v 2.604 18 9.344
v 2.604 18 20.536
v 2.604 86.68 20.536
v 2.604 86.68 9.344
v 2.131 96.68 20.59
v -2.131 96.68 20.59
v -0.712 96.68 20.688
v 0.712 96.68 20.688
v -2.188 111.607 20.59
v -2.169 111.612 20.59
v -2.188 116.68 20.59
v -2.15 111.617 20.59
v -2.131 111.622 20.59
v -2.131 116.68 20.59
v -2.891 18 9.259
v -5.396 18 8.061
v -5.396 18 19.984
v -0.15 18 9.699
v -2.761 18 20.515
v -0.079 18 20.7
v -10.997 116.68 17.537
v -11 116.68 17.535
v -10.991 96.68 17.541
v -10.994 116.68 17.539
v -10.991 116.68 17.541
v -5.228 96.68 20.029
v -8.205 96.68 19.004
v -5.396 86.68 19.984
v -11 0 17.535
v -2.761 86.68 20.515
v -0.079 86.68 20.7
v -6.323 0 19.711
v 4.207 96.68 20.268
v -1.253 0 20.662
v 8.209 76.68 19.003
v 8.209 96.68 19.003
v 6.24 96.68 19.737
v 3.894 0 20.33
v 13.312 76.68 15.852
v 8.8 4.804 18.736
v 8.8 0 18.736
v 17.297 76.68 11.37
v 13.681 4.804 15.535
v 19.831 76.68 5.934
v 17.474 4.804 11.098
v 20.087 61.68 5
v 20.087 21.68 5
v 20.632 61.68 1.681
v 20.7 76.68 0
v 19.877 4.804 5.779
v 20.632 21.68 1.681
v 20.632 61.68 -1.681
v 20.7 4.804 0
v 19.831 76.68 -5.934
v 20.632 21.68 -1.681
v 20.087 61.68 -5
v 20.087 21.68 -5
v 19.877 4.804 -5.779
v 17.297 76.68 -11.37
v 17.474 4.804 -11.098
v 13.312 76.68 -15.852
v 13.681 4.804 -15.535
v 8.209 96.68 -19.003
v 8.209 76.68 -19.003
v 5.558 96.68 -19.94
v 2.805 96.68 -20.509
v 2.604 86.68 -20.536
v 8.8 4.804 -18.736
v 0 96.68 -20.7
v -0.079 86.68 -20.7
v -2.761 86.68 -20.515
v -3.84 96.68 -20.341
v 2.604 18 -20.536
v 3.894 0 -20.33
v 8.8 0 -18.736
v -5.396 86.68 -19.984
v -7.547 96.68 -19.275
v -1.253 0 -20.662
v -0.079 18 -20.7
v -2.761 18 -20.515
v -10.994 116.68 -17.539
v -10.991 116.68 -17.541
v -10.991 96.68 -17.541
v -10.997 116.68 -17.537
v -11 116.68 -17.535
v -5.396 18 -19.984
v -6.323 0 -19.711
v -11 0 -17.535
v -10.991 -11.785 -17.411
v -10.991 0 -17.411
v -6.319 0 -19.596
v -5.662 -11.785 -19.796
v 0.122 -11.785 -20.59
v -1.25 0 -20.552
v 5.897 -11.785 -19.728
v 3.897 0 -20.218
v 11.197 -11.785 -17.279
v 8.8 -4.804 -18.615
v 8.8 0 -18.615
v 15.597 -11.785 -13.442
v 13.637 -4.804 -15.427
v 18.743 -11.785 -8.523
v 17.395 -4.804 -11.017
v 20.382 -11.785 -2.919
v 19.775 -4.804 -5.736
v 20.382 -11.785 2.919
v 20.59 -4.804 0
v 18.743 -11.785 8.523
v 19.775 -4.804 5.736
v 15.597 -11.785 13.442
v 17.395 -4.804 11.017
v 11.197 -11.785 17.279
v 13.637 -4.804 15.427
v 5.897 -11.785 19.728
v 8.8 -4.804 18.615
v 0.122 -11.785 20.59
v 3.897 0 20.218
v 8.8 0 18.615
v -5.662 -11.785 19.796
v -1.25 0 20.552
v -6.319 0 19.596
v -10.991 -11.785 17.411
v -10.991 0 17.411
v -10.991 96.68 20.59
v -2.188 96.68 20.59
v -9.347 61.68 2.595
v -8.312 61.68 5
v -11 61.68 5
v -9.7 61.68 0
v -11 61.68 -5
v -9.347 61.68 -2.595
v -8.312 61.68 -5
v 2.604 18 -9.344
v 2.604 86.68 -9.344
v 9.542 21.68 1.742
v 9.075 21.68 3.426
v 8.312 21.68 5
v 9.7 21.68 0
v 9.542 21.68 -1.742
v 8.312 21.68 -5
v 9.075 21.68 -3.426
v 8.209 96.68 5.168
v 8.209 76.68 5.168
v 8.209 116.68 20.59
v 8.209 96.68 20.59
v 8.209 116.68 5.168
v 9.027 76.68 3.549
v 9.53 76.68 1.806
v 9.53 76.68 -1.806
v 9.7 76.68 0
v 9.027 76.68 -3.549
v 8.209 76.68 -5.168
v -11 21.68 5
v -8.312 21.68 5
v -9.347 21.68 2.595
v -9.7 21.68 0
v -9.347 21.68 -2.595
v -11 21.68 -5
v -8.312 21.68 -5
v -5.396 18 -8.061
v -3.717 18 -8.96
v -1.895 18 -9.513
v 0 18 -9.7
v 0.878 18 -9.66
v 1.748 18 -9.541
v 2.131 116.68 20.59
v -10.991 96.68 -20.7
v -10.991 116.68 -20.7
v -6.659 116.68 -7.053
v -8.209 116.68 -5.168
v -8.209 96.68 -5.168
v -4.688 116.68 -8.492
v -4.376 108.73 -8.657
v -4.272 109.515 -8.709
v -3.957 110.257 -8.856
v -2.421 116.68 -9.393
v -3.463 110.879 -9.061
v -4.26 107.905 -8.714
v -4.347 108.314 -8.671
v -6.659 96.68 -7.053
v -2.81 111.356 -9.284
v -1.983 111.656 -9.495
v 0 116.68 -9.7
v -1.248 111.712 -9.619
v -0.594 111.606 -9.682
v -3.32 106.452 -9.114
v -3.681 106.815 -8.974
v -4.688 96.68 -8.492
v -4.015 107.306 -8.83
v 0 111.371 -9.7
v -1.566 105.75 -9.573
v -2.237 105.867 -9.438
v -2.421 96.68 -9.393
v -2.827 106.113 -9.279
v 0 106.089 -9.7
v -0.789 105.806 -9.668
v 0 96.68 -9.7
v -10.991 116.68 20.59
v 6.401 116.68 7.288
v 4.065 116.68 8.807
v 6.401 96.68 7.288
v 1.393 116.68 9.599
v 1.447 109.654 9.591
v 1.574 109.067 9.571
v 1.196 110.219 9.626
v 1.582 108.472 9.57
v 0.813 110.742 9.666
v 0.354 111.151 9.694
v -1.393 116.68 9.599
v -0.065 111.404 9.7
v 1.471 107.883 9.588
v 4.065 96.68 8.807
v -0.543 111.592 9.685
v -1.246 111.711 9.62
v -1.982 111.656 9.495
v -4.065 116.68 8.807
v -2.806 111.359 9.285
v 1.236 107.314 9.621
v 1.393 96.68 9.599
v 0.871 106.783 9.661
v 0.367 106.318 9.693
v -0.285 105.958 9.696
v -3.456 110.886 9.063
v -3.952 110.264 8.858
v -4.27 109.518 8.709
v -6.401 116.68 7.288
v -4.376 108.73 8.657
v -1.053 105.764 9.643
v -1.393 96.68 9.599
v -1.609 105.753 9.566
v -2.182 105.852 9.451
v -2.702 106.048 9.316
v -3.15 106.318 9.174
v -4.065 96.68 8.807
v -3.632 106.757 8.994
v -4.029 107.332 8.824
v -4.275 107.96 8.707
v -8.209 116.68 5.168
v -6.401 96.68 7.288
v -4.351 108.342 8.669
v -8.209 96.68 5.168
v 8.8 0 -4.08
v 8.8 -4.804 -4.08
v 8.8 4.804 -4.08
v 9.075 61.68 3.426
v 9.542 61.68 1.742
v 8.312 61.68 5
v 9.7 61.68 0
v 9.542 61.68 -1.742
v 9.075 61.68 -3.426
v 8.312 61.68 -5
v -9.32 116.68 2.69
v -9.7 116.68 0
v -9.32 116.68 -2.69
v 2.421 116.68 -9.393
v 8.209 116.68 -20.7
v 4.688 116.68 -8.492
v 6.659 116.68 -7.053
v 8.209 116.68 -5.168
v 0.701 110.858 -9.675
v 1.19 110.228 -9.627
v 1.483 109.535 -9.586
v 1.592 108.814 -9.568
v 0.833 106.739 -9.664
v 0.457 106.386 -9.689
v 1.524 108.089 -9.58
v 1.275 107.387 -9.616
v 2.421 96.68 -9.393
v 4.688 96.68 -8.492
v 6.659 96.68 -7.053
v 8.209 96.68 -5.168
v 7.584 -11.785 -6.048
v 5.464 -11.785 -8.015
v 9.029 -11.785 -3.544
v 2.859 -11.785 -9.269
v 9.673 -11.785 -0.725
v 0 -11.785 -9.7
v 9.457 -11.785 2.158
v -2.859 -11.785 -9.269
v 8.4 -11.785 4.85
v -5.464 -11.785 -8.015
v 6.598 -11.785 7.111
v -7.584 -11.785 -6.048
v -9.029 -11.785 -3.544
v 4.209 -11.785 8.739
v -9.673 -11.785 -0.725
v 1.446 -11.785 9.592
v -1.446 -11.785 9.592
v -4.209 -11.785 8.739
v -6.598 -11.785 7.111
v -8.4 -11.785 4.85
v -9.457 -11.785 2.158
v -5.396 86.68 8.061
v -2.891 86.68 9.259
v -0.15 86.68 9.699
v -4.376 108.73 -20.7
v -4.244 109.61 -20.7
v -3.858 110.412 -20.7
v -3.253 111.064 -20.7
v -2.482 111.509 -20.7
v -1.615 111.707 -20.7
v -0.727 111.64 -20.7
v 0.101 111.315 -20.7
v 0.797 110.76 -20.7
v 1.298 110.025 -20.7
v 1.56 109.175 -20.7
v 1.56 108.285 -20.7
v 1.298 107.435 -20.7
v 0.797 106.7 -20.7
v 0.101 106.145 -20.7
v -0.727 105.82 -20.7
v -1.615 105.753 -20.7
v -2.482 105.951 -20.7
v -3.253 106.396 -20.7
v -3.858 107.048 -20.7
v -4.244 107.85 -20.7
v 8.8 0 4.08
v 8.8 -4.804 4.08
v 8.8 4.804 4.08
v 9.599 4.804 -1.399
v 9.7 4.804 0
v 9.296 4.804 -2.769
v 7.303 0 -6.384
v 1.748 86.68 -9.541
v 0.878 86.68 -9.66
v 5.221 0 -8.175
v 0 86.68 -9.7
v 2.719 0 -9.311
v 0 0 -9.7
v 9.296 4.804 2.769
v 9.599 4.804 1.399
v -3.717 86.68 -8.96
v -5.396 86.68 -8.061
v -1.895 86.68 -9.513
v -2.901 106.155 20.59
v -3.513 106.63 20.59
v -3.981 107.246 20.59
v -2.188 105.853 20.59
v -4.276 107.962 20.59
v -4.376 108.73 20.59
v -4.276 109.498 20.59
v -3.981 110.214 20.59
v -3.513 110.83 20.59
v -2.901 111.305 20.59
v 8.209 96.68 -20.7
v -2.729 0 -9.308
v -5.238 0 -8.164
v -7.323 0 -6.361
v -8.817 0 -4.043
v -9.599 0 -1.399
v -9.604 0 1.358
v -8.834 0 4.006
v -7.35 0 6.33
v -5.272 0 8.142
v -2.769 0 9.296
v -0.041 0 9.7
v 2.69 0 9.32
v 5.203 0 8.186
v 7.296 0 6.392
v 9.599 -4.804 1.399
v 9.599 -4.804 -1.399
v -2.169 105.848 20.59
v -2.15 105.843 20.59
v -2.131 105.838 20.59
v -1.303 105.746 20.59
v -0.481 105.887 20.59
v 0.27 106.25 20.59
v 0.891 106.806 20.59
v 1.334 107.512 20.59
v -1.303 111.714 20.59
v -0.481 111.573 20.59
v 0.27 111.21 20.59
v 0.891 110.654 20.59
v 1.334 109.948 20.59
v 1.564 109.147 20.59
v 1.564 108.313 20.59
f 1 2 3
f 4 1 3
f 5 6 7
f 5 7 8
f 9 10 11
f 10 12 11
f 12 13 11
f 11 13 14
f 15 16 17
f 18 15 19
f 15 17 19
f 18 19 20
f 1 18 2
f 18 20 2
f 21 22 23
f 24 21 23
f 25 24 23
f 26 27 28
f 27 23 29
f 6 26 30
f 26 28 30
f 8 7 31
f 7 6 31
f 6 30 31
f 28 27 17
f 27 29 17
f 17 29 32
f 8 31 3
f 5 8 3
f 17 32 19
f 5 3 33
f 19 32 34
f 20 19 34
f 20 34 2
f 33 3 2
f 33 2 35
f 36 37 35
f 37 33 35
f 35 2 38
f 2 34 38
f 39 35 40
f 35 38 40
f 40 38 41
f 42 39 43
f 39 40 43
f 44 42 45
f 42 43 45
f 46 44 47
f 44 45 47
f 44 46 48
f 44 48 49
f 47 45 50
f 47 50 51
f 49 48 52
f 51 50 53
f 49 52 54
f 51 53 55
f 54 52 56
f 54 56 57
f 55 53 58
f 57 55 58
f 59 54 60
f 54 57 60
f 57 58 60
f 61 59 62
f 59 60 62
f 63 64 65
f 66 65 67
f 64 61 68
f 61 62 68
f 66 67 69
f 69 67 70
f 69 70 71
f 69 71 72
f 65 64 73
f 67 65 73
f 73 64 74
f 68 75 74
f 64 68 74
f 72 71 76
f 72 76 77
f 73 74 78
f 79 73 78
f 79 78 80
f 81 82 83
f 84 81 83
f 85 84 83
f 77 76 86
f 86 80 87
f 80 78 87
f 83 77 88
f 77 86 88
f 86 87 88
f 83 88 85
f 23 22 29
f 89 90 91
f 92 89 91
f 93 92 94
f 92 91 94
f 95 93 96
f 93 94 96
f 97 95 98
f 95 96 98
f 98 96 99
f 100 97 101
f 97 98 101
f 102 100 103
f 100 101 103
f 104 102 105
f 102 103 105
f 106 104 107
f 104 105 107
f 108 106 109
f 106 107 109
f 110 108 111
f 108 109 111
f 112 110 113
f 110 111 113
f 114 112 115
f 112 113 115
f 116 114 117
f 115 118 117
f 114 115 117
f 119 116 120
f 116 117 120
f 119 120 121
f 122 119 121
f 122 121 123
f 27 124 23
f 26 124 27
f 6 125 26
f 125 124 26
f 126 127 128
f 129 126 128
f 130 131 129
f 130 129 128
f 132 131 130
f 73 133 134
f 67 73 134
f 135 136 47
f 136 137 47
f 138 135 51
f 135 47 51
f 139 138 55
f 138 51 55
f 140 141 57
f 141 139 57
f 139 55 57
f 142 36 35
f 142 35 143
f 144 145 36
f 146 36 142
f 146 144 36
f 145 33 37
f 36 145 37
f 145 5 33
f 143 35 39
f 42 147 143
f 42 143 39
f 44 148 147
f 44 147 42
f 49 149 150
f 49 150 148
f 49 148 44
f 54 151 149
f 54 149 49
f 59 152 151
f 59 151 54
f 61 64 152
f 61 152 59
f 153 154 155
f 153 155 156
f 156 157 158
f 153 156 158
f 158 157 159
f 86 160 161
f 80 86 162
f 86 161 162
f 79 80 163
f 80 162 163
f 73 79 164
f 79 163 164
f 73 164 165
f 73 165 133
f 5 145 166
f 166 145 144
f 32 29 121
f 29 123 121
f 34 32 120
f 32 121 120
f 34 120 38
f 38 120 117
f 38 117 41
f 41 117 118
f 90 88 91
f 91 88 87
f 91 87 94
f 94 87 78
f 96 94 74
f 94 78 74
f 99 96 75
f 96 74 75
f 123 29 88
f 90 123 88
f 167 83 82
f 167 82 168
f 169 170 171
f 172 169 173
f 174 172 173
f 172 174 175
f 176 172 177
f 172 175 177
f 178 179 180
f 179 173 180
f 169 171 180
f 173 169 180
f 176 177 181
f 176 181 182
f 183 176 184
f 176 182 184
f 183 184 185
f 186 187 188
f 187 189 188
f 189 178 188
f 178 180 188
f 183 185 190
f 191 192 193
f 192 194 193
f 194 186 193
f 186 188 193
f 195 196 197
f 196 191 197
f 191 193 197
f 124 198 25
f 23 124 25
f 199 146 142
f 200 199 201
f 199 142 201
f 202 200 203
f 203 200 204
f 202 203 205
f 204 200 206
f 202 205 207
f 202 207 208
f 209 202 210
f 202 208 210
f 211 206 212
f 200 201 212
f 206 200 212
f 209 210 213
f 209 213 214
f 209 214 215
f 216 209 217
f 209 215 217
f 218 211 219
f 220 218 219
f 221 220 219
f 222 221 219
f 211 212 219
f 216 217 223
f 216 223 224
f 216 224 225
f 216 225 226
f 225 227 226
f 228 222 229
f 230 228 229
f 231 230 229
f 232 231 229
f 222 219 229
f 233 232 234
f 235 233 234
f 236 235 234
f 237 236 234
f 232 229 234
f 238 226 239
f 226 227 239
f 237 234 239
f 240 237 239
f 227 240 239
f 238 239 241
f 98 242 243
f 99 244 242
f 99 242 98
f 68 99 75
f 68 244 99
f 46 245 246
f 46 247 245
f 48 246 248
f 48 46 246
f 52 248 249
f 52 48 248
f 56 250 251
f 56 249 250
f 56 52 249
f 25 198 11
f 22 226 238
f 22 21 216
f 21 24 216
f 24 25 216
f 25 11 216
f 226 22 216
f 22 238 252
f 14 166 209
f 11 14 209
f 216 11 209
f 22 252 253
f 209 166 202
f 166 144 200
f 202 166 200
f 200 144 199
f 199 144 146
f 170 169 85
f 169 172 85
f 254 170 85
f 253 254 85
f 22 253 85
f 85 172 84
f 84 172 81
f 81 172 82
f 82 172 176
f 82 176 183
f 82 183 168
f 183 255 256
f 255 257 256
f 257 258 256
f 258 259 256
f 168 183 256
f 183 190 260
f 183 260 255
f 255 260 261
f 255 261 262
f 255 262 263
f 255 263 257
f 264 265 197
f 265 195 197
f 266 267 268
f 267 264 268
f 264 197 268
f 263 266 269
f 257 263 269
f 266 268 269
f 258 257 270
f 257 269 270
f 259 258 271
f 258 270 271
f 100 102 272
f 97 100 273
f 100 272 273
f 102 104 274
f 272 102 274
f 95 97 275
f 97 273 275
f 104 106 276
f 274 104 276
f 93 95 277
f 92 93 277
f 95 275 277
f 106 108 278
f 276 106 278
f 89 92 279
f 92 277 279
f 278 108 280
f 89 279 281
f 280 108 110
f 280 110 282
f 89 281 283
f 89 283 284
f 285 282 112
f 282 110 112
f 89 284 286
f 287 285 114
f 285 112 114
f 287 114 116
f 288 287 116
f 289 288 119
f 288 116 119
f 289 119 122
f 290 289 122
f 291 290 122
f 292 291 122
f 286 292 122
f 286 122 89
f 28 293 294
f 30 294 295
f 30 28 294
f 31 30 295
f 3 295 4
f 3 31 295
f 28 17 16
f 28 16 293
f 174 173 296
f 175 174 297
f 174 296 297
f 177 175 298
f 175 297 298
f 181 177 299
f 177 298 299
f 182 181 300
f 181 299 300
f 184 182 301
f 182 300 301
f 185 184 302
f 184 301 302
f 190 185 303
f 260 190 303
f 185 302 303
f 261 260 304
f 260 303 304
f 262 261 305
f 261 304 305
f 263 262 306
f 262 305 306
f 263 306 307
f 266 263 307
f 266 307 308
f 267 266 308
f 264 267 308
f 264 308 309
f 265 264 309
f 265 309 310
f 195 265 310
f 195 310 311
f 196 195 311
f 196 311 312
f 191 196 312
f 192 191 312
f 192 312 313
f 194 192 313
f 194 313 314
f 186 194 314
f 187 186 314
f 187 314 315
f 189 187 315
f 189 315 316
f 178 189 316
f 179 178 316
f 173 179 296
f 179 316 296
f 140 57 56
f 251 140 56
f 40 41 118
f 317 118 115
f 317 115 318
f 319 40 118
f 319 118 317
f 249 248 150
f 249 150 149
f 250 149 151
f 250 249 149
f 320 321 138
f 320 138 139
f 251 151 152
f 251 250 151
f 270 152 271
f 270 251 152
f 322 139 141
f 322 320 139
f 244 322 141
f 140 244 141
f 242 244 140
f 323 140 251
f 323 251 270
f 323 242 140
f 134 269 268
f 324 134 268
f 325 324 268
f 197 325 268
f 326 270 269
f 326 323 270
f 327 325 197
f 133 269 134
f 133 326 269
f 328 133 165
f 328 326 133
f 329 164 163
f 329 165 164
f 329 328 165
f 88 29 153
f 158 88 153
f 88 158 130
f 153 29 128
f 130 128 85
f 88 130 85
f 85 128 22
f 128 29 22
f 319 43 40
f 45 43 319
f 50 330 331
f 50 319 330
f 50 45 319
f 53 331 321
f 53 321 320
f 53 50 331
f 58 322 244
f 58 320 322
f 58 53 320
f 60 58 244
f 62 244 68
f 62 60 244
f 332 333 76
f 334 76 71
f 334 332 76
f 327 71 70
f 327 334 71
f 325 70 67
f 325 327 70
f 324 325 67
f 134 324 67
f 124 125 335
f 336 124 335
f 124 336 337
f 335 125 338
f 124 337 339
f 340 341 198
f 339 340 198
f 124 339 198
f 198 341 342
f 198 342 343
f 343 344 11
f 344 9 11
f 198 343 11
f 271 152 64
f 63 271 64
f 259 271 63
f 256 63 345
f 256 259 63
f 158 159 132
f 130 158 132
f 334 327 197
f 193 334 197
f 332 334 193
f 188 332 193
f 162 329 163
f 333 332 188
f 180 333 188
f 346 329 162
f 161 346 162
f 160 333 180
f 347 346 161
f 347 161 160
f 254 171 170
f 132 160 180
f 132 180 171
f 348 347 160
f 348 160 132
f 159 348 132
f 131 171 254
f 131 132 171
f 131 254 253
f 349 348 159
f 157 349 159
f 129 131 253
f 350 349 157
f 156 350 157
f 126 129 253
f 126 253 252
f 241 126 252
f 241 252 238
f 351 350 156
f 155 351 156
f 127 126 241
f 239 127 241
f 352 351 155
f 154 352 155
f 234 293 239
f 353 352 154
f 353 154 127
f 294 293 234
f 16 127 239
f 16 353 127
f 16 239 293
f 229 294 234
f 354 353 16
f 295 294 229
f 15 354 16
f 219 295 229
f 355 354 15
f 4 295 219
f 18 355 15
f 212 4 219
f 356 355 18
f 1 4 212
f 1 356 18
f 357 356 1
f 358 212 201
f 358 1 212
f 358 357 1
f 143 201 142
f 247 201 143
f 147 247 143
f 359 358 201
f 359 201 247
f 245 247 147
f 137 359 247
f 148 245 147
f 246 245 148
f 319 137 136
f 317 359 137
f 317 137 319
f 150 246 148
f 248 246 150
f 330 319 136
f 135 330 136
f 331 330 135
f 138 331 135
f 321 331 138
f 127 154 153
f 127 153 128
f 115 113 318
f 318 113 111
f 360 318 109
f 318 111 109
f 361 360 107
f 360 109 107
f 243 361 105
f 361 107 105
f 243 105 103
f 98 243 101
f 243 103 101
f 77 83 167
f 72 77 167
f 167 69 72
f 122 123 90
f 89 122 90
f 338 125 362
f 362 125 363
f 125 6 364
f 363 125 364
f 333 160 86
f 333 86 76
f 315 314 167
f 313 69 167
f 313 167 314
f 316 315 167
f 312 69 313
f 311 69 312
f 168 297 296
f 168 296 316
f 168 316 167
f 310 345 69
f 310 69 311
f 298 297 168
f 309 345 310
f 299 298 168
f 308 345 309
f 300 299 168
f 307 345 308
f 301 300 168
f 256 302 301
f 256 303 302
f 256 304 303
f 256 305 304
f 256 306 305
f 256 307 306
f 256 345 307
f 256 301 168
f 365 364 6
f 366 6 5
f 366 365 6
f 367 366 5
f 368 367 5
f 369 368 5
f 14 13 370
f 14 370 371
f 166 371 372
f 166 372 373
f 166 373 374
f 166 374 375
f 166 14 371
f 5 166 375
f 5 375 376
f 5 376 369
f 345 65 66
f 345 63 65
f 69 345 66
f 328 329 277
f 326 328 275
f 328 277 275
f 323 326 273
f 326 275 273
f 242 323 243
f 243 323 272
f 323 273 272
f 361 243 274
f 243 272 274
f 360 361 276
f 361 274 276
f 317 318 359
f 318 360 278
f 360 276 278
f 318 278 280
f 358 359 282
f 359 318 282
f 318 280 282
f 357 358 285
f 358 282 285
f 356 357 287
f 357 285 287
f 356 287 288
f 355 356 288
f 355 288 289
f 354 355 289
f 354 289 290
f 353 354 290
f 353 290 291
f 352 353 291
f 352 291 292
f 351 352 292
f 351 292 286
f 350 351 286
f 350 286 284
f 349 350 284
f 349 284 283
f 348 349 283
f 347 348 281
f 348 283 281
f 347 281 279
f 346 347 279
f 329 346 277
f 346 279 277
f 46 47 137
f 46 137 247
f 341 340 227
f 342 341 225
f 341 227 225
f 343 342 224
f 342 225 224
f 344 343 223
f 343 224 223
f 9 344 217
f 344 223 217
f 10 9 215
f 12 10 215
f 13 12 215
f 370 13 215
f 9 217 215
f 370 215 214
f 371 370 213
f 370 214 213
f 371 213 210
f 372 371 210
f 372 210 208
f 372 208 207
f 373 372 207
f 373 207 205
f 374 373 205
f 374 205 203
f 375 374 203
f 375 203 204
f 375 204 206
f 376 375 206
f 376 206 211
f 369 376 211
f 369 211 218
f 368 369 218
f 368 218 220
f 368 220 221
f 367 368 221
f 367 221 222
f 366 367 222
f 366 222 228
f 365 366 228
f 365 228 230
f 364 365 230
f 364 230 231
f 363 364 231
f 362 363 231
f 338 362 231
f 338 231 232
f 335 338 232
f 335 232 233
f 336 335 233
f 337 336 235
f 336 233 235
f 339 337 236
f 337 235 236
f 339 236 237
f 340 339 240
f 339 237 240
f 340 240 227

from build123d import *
from build123d.topology import SkipClean

# Parameters (mm, degrees)
SKETCH_1_R           = 20.7
SKETCH_1_R_2         = 9.7
EXTRUDE_1_DEPTH      = 116.68
SKETCH_11_W          = 27
SKETCH_11_H          = 150
CUT_EXTRUDE_3_DEPTH  = 40
SKETCH_13_W          = 10
SKETCH_13_H          = 128.345013401
CUT_EXTRUDE_7_DEPTH  = 126.624847861
SKETCH_15_W          = 8
SKETCH_15_H          = 68.68
CUT_EXTRUDE_9_DEPTH  = 48
SKETCH_16_W          = 15.531795971
SKETCH_16_H          = 20
SKETCH_16_W_2        = 15.421795971
EXTRUDE_4_DEPTH      = 19.2
SKETCH_21_R          = 2.985
CUT_EXTRUDE_12_DEPTH = 55.2
SKETCH_24_R          = 20.59
SKETCH_24_R_2        = 9.59
EXTRUDE_2_DEPTH      = 55.2
CUT_EXTRUDE_13_DEPTH = 55.2
SKETCH_26_W          = 10.00851187
SKETCH_26_H          = 41.7
CUT_EXTRUDE_15_DEPTH = 55.2
SKETCH_27_W          = 10
SKETCH_27_H          = 40
CUT_EXTRUDE_16_DEPTH = 55.2
SKETCH_28_W          = 44.880694938
SKETCH_28_H          = 9.608044066
CUT_EXTRUDE_17_DEPTH = 12.2
CUT_EXTRUDE_START    = -130
SKETCH_63_R          = 9.59
CUT_EXTRUDE_36_DEPTH = 130
SKETCH_64_R          = 9.7
CUT_EXTRUDE_37_DEPTH = 132.758249301
SKETCH_66_W          = 4.319030686
SKETCH_66_H          = 0.800519568
CUT_EXTRUDE_39_DEPTH = 20


with BuildPart() as part:
    # 草圖1 → 伸長-薄件1 (new body)
    with BuildSketch(Plane(origin=(0, 0, 0), x_dir=(1, 0, 0), z_dir=(0, 1, 0))):
        Circle(SKETCH_1_R)
        Circle(SKETCH_1_R_2, mode=Mode.SUBTRACT)
    extrude(amount=EXTRUDE_1_DEPTH)

    # 草圖11 → 除料-伸長3 (cut)
    with BuildSketch(Plane(origin=(0, 116.68, 0), x_dir=(1, 0, 0), z_dir=(0, 1, 0))):
        with Locations((21.70851187, -44.235815192)):
            Rectangle(SKETCH_11_W, SKETCH_11_H)
    extrude(amount=-CUT_EXTRUDE_3_DEPTH, mode=Mode.SUBTRACT)

    # 草圖13 → 除料-伸長7 (cut, through all)
    with BuildSketch(Plane.XY.offset(21)):
        with Locations((-16, 58.612182466)):
            Rectangle(SKETCH_13_W, SKETCH_13_H)
    extrude(amount=-CUT_EXTRUDE_7_DEPTH, mode=Mode.SUBTRACT)

    # 草圖15 → 除料-伸長9 (cut)
    with BuildSketch(Plane.XY.offset(21)):
        with Locations((-1.395744065, 52.34)):
            Rectangle(SKETCH_15_W, SKETCH_15_H)
    extrude(amount=-CUT_EXTRUDE_9_DEPTH, mode=Mode.SUBTRACT)

    # 草圖16 → 填料-伸長4 (add)
    with BuildSketch(Plane(origin=(8.20851187, 0, 0), x_dir=(0, 0, -1), z_dir=(1, 0, 0))):
        with Locations((12.934102015, 106.68)):
            Rectangle(SKETCH_16_W, SKETCH_16_H)
        with Locations((-12.879102014, 106.68)):
            Rectangle(SKETCH_16_W_2, SKETCH_16_H)
    extrude(amount=-EXTRUDE_4_DEPTH)

    # 草圖21 → 除料-伸長12 (cut)
    with BuildSketch(Plane(origin=(0, 0, -20.7), x_dir=(-1, 0, 0), z_dir=(0, 0, -1))):
        with Locations((1.39148813, 108.73)):
            Circle(SKETCH_21_R)
    extrude(amount=-CUT_EXTRUDE_12_DEPTH, mode=Mode.SUBTRACT)

    # 草圖24 → 伸長-薄件2 (add)
    with BuildSketch(Plane.XZ):
        Circle(SKETCH_24_R)
        Circle(SKETCH_24_R_2, mode=Mode.SUBTRACT)
    extrude(amount=EXTRUDE_2_DEPTH)

    # 草圖25 → 除料-伸長13 (cut)
    with BuildSketch(Plane.XY.offset(21)):
        Polygon((-1.39148813, -11.785), (22.612379708, -11.785), (22.612379708, -63.873337429), (-22.749525245, -63.873337429), (-22.749525245, -11.785), align=None)
    extrude(amount=-CUT_EXTRUDE_13_DEPTH, mode=Mode.SUBTRACT)

    # 草圖26 → 除料-伸長15 (cut)
    with BuildSketch(Plane(origin=(0, 0, 0), x_dir=(1, 0, 0), z_dir=(0, 1, 0))):
        with Locations((-15.995744065, -0.15)):
            Rectangle(SKETCH_26_W, SKETCH_26_H)
    extrude(amount=-CUT_EXTRUDE_15_DEPTH, mode=Mode.SUBTRACT)

    # 草圖27 → 除料-伸長16 (cut)
    with BuildSketch(Plane(origin=(21, 0, 0), x_dir=(0, 0, -1), z_dir=(1, 0, 0))):
        with Locations((0, 41.68)):
            Rectangle(SKETCH_27_W, SKETCH_27_H)
    extrude(amount=-CUT_EXTRUDE_16_DEPTH, mode=Mode.SUBTRACT)

    # 草圖28 → 除料-伸長17 (cut)
    with BuildSketch(Plane(origin=(21, 0, 0), x_dir=(0, 0, -1), z_dir=(1, 0, 0))):
        Rectangle(SKETCH_28_W, SKETCH_28_H)
    extrude(amount=-CUT_EXTRUDE_17_DEPTH, mode=Mode.SUBTRACT)

    # 草圖63 → 除料-伸長36 (cut)
    with BuildSketch(Plane.XZ.offset(11.785).offset(CUT_EXTRUDE_START)):
        with Locations(Location((0, 0, 0), (0, 0, 90))):
            Circle(SKETCH_63_R)
    extrude(amount=CUT_EXTRUDE_36_DEPTH, mode=Mode.SUBTRACT)

    # 草圖64 → 除料-伸長37 (cut, through all)
    with SkipClean():  # the faces are left unmerged after this step: merging them gives an invalid solid
        with BuildSketch(Plane.XZ.offset(11.785)):
            with Locations(Location((0, 0, 0), (0, 0, 270))):
                Circle(SKETCH_64_R)
        extrude(amount=-CUT_EXTRUDE_37_DEPTH, mode=Mode.SUBTRACT)

    # 草圖66 → 除料-伸長39 (cut)
    with SkipClean():  # the faces are left unmerged after this step: merging them gives an invalid solid
        with BuildSketch(Plane(origin=(0, 116.68, 0), x_dir=(1, 0, 0), z_dir=(0, 1, 0))):
            with Locations((-0.028341957, -20.990259784)):
                Rectangle(SKETCH_66_W, SKETCH_66_H)
        extrude(amount=-CUT_EXTRUDE_39_DEPTH, mode=Mode.SUBTRACT)


solid = part.part
